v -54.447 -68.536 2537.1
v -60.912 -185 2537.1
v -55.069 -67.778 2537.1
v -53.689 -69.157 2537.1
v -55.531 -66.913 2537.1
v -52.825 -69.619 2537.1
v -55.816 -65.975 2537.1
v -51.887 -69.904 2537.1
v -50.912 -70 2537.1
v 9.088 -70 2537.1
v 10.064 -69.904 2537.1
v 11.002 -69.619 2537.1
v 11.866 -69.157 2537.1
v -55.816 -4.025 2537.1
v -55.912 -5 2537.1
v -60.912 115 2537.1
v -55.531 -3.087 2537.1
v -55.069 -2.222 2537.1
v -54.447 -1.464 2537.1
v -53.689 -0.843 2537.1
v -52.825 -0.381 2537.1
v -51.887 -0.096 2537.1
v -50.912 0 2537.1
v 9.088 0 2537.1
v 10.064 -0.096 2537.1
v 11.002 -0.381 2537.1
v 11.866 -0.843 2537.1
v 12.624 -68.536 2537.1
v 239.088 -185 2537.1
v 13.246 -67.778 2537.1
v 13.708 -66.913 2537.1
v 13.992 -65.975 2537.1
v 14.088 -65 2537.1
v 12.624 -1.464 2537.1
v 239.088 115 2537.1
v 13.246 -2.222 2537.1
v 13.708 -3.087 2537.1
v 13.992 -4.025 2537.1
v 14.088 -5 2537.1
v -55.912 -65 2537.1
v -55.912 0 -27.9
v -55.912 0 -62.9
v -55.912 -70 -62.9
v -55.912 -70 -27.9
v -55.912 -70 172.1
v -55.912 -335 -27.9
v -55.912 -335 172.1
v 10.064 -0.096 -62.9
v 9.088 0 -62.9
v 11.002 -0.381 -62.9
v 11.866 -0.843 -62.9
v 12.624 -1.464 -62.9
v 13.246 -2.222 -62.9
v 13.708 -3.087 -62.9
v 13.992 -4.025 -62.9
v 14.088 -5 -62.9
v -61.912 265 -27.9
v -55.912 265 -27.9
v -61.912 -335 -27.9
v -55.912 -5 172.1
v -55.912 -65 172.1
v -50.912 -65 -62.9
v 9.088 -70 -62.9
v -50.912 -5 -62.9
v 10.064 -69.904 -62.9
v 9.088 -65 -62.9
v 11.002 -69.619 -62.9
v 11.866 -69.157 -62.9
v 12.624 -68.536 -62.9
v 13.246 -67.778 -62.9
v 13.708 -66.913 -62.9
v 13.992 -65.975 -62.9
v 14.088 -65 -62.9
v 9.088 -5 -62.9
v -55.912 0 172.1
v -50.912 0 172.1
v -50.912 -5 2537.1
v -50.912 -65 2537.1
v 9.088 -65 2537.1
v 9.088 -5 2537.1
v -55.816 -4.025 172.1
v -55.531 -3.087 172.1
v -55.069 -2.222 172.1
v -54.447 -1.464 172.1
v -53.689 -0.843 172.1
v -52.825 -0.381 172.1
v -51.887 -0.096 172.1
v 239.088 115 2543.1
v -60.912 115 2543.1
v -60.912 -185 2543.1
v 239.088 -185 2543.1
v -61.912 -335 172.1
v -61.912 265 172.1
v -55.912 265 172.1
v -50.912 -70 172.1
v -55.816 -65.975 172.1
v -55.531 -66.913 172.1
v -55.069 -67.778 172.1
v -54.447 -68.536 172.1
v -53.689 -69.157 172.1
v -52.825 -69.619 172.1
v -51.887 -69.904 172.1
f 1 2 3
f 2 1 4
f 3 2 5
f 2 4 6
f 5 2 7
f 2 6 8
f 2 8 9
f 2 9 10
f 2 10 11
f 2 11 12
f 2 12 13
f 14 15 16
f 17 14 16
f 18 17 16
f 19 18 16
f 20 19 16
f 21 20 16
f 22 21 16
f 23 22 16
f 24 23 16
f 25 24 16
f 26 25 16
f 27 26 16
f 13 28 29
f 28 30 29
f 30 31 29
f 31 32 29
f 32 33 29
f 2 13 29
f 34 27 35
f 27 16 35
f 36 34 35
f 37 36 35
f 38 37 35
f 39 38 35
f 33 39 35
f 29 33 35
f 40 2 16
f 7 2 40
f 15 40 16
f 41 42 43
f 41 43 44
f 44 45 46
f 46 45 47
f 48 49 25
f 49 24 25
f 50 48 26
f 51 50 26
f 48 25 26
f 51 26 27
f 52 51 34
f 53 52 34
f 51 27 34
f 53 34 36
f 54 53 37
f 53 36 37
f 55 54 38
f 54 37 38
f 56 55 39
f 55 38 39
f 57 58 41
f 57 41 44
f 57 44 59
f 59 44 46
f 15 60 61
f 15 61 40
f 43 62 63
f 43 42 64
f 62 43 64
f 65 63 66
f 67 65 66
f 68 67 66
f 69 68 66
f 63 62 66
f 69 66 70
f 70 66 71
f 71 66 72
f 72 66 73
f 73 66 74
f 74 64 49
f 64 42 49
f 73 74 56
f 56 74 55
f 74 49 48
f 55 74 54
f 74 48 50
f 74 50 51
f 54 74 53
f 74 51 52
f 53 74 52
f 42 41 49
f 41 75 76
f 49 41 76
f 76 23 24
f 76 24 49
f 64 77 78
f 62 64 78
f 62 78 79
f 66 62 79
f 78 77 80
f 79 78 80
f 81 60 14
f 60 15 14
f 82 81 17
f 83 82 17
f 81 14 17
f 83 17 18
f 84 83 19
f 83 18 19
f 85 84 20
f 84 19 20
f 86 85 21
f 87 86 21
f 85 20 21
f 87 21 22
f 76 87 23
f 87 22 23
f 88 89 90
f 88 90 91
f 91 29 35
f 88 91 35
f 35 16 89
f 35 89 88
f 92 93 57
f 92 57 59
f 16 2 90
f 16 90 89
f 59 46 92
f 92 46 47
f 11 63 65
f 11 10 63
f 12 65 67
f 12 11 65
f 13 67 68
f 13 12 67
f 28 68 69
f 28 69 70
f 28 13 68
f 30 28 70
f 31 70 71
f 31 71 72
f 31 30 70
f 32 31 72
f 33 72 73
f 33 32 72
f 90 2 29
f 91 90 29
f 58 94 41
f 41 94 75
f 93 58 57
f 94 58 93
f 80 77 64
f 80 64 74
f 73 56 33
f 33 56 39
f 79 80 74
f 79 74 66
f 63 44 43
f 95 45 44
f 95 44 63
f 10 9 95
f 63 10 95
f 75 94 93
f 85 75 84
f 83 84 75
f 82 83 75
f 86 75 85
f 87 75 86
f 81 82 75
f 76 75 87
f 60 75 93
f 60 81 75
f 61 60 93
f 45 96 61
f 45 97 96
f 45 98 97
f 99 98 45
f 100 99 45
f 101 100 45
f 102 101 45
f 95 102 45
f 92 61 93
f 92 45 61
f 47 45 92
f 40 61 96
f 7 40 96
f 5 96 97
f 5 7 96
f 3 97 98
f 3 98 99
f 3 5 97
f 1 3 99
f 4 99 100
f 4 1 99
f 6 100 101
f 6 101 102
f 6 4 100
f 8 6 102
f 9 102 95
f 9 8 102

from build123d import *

# Parameters (mm, degrees)
F0_W     = 70
F0_H     = 2600
F1_DEPTH = 70
F2_W     = 60
F2_H     = 60
F3_DEPTH = 2600
F4_W     = 600
F4_H     = 200
F5_DEPTH = 6
F6_R     = 5
F7_W     = 300
F7_H     = 300
F8_DEPTH = 6


with BuildPart() as f1:
    # F0 (on Front) → F1 (new body)
    with BuildSketch(Plane.XZ):
        with Locations((-20.9116117656, 1237.1002838016)):
            Rectangle(F0_W, F0_H)
    extrude(amount=F1_DEPTH)

    # F2 (on face) → F3 (cut, through all)
    with BuildSketch(Plane(origin=(0, 0, -62.8997161984), x_dir=(1, 0, 0), z_dir=(0, 0, -1))):
        with Locations((-20.9116117656, 35)):
            Rectangle(F2_W, F2_H)
    extrude(amount=-F3_DEPTH, mode=Mode.SUBTRACT)

    # F4 (on face) → F5 (join)
    with BuildSketch(Plane(origin=(-55.9116117656, 0, 0), x_dir=(0, -1, 0), z_dir=(-1, 0, 0))):
        with Locations((35, 72.1002838016)):
            Rectangle(F4_W, F4_H)
    extrude(amount=F5_DEPTH)

    # F6
    f6_edges = [f1.edges().sort_by_distance(p)[0] for p in [
        (14.088388, 0, 1237.100284),
        (14.088388, -70, 1237.100284),
        (-55.911612, 0, 1354.600284),
        (-55.911612, -70, 1354.600284),
    ]]
    fillet(f6_edges, radius=F6_R)

    # F7 (on face) → F8 (join)
    with BuildSketch(Plane.XY.offset(2537.1002838016)):
        with Locations((89.0883882344, -35)):
            Rectangle(F7_W, F7_H)
    extrude(amount=F8_DEPTH)


solid = f1.part
